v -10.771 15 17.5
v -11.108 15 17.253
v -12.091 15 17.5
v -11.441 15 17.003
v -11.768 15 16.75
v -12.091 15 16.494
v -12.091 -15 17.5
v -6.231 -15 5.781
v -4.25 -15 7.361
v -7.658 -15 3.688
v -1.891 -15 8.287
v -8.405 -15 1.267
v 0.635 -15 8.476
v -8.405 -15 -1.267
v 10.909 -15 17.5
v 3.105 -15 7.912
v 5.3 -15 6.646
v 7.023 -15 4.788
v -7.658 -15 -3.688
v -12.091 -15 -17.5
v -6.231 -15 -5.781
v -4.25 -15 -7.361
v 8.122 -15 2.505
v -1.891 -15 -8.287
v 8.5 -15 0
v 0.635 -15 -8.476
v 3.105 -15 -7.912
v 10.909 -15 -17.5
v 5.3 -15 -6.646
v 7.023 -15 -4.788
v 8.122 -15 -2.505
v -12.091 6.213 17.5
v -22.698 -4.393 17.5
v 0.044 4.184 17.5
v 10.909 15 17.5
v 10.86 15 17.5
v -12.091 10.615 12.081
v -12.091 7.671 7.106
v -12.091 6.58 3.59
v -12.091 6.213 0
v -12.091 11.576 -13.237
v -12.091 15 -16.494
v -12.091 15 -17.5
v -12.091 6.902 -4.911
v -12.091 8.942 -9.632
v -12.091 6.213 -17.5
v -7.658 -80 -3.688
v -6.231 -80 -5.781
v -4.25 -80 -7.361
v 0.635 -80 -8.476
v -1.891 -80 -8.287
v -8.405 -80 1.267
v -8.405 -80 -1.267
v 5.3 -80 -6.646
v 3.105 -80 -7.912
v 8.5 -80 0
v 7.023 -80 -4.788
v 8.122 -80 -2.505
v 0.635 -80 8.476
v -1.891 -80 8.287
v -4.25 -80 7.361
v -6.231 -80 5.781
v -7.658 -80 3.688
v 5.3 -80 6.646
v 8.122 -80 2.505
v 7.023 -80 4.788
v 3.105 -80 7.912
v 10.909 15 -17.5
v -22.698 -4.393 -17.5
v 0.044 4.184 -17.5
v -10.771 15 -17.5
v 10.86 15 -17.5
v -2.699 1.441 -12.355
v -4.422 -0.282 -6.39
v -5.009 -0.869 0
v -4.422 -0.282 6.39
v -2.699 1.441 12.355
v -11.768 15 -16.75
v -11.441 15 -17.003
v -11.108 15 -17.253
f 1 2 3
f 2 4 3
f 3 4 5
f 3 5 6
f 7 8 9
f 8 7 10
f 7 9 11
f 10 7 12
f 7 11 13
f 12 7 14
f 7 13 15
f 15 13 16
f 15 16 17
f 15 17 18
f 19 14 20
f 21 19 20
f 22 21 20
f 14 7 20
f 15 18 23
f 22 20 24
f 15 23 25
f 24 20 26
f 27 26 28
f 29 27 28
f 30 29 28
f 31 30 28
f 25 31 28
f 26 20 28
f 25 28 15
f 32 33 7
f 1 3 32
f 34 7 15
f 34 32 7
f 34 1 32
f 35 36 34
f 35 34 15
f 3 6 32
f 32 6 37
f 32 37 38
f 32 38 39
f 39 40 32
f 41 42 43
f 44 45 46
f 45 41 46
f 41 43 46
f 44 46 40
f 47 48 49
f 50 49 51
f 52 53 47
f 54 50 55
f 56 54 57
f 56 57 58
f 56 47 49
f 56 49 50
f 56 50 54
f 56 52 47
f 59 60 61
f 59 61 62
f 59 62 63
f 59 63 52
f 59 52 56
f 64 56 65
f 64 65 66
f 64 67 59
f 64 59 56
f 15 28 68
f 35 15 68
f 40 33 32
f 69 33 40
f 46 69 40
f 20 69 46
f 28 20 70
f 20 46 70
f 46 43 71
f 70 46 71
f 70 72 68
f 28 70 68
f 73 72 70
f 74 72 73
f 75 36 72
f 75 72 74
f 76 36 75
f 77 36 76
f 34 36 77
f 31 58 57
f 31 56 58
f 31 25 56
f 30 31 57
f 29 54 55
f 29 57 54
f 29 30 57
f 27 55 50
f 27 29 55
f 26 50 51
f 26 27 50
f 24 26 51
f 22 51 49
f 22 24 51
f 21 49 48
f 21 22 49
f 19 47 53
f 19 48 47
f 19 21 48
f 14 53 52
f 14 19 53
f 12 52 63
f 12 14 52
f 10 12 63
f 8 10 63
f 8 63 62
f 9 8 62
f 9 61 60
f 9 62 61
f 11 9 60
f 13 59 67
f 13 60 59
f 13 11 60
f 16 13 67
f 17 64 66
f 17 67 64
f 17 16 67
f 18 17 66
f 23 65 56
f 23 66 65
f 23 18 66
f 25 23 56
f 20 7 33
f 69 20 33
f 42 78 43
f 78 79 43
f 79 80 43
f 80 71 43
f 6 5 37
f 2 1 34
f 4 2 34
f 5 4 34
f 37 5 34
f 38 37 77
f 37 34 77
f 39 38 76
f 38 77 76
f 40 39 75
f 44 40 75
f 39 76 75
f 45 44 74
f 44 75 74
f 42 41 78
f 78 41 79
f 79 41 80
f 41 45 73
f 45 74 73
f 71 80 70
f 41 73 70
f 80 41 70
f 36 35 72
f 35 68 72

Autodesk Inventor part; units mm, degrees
ref_plane "YZ Plane" through (0, 0, 0) normal (1, 0, 0) x (0, 1, 0)
ref_plane "XZ Plane" through (0, 0, 0) normal (0, 1, 0) x (-1, 0, 0)
ref_plane "XY Plane" through (0, 0, 0) normal (0, 0, 1) x (1, 0, 0)
sketch "Sketch1" plane through (0, 0, 0) normal (0, 0, 1) x (1, 0, 0)
  line L0 (10.9091, 15) -> (-12.0909, 15)
  line L1 (-12.0909, 15) -> (-12.0909, -15)
  line L2 (-12.0909, -15) -> (10.9091, -15)
  line L3 (10.9091, -15) -> (10.9091, 15)
  line L4 (-12.0909, -15) -> (-22.6975, -4.3934)
  line L5 (-12.0909, -15) -> (2.9091, -15) construction
  line L6 (-22.6975, -4.3934) -> (-12.0909, 6.2132)
  line L7 (-12.0909, 6.2132) -> (2.0731, -7.9508) construction
  line L8 (10.9091, 15.0492) -> (-9.4479, -5.3079) construction
  line L9 (-8.4113, 37.889) -> (15.6041, 13.8735) construction
  line L10 (-5.0089, -0.8688) -> (12.6688, 16.8089)
  line L11 (12.6688, 16.8089) -> (-8.4113, 37.889)
  line L12 (-8.4113, 37.889) -> (-26.089, 20.2113)
  line L13 (-26.089, 20.2113) -> (-5.0089, -0.8688)
  point P0 (0, 0)
  point P1 (10.9091, 0)
  dimension "d0" = 30
  dimension "d1" = 23
  dimension "d2" = 15
  dimension "d3" = 135
  dimension "d4" = 15
  dimension "d5" = 25
extrude "Extrusion1" add sketch "Sketch1" along normal mid plane 35 contours L3 L2 L1 L13 L10 L0 | L10 L13 L1 L0 | L4 L6 L1
revolve "Revolution1" cut sketch "Sketch1" angle 360 about axis through (12.6688, 16.8089, 0) along (-0.7071, 0.7071, 0) contours L10 L13 L1 L0 | L0 L1 L13 L12 L11 L10
sketch "Sketch2" plane through (-12.0909, -15, 17.5) normal (0, -1, 0) x (1, 0, 0)
  circle A0 centre (12.0909, -17.5) radius 8.5
  dimension "d9" = 17
extrude "Extrusion2" add sketch "Sketch2" along normal blind 65
properties part number "Feed_pin"
